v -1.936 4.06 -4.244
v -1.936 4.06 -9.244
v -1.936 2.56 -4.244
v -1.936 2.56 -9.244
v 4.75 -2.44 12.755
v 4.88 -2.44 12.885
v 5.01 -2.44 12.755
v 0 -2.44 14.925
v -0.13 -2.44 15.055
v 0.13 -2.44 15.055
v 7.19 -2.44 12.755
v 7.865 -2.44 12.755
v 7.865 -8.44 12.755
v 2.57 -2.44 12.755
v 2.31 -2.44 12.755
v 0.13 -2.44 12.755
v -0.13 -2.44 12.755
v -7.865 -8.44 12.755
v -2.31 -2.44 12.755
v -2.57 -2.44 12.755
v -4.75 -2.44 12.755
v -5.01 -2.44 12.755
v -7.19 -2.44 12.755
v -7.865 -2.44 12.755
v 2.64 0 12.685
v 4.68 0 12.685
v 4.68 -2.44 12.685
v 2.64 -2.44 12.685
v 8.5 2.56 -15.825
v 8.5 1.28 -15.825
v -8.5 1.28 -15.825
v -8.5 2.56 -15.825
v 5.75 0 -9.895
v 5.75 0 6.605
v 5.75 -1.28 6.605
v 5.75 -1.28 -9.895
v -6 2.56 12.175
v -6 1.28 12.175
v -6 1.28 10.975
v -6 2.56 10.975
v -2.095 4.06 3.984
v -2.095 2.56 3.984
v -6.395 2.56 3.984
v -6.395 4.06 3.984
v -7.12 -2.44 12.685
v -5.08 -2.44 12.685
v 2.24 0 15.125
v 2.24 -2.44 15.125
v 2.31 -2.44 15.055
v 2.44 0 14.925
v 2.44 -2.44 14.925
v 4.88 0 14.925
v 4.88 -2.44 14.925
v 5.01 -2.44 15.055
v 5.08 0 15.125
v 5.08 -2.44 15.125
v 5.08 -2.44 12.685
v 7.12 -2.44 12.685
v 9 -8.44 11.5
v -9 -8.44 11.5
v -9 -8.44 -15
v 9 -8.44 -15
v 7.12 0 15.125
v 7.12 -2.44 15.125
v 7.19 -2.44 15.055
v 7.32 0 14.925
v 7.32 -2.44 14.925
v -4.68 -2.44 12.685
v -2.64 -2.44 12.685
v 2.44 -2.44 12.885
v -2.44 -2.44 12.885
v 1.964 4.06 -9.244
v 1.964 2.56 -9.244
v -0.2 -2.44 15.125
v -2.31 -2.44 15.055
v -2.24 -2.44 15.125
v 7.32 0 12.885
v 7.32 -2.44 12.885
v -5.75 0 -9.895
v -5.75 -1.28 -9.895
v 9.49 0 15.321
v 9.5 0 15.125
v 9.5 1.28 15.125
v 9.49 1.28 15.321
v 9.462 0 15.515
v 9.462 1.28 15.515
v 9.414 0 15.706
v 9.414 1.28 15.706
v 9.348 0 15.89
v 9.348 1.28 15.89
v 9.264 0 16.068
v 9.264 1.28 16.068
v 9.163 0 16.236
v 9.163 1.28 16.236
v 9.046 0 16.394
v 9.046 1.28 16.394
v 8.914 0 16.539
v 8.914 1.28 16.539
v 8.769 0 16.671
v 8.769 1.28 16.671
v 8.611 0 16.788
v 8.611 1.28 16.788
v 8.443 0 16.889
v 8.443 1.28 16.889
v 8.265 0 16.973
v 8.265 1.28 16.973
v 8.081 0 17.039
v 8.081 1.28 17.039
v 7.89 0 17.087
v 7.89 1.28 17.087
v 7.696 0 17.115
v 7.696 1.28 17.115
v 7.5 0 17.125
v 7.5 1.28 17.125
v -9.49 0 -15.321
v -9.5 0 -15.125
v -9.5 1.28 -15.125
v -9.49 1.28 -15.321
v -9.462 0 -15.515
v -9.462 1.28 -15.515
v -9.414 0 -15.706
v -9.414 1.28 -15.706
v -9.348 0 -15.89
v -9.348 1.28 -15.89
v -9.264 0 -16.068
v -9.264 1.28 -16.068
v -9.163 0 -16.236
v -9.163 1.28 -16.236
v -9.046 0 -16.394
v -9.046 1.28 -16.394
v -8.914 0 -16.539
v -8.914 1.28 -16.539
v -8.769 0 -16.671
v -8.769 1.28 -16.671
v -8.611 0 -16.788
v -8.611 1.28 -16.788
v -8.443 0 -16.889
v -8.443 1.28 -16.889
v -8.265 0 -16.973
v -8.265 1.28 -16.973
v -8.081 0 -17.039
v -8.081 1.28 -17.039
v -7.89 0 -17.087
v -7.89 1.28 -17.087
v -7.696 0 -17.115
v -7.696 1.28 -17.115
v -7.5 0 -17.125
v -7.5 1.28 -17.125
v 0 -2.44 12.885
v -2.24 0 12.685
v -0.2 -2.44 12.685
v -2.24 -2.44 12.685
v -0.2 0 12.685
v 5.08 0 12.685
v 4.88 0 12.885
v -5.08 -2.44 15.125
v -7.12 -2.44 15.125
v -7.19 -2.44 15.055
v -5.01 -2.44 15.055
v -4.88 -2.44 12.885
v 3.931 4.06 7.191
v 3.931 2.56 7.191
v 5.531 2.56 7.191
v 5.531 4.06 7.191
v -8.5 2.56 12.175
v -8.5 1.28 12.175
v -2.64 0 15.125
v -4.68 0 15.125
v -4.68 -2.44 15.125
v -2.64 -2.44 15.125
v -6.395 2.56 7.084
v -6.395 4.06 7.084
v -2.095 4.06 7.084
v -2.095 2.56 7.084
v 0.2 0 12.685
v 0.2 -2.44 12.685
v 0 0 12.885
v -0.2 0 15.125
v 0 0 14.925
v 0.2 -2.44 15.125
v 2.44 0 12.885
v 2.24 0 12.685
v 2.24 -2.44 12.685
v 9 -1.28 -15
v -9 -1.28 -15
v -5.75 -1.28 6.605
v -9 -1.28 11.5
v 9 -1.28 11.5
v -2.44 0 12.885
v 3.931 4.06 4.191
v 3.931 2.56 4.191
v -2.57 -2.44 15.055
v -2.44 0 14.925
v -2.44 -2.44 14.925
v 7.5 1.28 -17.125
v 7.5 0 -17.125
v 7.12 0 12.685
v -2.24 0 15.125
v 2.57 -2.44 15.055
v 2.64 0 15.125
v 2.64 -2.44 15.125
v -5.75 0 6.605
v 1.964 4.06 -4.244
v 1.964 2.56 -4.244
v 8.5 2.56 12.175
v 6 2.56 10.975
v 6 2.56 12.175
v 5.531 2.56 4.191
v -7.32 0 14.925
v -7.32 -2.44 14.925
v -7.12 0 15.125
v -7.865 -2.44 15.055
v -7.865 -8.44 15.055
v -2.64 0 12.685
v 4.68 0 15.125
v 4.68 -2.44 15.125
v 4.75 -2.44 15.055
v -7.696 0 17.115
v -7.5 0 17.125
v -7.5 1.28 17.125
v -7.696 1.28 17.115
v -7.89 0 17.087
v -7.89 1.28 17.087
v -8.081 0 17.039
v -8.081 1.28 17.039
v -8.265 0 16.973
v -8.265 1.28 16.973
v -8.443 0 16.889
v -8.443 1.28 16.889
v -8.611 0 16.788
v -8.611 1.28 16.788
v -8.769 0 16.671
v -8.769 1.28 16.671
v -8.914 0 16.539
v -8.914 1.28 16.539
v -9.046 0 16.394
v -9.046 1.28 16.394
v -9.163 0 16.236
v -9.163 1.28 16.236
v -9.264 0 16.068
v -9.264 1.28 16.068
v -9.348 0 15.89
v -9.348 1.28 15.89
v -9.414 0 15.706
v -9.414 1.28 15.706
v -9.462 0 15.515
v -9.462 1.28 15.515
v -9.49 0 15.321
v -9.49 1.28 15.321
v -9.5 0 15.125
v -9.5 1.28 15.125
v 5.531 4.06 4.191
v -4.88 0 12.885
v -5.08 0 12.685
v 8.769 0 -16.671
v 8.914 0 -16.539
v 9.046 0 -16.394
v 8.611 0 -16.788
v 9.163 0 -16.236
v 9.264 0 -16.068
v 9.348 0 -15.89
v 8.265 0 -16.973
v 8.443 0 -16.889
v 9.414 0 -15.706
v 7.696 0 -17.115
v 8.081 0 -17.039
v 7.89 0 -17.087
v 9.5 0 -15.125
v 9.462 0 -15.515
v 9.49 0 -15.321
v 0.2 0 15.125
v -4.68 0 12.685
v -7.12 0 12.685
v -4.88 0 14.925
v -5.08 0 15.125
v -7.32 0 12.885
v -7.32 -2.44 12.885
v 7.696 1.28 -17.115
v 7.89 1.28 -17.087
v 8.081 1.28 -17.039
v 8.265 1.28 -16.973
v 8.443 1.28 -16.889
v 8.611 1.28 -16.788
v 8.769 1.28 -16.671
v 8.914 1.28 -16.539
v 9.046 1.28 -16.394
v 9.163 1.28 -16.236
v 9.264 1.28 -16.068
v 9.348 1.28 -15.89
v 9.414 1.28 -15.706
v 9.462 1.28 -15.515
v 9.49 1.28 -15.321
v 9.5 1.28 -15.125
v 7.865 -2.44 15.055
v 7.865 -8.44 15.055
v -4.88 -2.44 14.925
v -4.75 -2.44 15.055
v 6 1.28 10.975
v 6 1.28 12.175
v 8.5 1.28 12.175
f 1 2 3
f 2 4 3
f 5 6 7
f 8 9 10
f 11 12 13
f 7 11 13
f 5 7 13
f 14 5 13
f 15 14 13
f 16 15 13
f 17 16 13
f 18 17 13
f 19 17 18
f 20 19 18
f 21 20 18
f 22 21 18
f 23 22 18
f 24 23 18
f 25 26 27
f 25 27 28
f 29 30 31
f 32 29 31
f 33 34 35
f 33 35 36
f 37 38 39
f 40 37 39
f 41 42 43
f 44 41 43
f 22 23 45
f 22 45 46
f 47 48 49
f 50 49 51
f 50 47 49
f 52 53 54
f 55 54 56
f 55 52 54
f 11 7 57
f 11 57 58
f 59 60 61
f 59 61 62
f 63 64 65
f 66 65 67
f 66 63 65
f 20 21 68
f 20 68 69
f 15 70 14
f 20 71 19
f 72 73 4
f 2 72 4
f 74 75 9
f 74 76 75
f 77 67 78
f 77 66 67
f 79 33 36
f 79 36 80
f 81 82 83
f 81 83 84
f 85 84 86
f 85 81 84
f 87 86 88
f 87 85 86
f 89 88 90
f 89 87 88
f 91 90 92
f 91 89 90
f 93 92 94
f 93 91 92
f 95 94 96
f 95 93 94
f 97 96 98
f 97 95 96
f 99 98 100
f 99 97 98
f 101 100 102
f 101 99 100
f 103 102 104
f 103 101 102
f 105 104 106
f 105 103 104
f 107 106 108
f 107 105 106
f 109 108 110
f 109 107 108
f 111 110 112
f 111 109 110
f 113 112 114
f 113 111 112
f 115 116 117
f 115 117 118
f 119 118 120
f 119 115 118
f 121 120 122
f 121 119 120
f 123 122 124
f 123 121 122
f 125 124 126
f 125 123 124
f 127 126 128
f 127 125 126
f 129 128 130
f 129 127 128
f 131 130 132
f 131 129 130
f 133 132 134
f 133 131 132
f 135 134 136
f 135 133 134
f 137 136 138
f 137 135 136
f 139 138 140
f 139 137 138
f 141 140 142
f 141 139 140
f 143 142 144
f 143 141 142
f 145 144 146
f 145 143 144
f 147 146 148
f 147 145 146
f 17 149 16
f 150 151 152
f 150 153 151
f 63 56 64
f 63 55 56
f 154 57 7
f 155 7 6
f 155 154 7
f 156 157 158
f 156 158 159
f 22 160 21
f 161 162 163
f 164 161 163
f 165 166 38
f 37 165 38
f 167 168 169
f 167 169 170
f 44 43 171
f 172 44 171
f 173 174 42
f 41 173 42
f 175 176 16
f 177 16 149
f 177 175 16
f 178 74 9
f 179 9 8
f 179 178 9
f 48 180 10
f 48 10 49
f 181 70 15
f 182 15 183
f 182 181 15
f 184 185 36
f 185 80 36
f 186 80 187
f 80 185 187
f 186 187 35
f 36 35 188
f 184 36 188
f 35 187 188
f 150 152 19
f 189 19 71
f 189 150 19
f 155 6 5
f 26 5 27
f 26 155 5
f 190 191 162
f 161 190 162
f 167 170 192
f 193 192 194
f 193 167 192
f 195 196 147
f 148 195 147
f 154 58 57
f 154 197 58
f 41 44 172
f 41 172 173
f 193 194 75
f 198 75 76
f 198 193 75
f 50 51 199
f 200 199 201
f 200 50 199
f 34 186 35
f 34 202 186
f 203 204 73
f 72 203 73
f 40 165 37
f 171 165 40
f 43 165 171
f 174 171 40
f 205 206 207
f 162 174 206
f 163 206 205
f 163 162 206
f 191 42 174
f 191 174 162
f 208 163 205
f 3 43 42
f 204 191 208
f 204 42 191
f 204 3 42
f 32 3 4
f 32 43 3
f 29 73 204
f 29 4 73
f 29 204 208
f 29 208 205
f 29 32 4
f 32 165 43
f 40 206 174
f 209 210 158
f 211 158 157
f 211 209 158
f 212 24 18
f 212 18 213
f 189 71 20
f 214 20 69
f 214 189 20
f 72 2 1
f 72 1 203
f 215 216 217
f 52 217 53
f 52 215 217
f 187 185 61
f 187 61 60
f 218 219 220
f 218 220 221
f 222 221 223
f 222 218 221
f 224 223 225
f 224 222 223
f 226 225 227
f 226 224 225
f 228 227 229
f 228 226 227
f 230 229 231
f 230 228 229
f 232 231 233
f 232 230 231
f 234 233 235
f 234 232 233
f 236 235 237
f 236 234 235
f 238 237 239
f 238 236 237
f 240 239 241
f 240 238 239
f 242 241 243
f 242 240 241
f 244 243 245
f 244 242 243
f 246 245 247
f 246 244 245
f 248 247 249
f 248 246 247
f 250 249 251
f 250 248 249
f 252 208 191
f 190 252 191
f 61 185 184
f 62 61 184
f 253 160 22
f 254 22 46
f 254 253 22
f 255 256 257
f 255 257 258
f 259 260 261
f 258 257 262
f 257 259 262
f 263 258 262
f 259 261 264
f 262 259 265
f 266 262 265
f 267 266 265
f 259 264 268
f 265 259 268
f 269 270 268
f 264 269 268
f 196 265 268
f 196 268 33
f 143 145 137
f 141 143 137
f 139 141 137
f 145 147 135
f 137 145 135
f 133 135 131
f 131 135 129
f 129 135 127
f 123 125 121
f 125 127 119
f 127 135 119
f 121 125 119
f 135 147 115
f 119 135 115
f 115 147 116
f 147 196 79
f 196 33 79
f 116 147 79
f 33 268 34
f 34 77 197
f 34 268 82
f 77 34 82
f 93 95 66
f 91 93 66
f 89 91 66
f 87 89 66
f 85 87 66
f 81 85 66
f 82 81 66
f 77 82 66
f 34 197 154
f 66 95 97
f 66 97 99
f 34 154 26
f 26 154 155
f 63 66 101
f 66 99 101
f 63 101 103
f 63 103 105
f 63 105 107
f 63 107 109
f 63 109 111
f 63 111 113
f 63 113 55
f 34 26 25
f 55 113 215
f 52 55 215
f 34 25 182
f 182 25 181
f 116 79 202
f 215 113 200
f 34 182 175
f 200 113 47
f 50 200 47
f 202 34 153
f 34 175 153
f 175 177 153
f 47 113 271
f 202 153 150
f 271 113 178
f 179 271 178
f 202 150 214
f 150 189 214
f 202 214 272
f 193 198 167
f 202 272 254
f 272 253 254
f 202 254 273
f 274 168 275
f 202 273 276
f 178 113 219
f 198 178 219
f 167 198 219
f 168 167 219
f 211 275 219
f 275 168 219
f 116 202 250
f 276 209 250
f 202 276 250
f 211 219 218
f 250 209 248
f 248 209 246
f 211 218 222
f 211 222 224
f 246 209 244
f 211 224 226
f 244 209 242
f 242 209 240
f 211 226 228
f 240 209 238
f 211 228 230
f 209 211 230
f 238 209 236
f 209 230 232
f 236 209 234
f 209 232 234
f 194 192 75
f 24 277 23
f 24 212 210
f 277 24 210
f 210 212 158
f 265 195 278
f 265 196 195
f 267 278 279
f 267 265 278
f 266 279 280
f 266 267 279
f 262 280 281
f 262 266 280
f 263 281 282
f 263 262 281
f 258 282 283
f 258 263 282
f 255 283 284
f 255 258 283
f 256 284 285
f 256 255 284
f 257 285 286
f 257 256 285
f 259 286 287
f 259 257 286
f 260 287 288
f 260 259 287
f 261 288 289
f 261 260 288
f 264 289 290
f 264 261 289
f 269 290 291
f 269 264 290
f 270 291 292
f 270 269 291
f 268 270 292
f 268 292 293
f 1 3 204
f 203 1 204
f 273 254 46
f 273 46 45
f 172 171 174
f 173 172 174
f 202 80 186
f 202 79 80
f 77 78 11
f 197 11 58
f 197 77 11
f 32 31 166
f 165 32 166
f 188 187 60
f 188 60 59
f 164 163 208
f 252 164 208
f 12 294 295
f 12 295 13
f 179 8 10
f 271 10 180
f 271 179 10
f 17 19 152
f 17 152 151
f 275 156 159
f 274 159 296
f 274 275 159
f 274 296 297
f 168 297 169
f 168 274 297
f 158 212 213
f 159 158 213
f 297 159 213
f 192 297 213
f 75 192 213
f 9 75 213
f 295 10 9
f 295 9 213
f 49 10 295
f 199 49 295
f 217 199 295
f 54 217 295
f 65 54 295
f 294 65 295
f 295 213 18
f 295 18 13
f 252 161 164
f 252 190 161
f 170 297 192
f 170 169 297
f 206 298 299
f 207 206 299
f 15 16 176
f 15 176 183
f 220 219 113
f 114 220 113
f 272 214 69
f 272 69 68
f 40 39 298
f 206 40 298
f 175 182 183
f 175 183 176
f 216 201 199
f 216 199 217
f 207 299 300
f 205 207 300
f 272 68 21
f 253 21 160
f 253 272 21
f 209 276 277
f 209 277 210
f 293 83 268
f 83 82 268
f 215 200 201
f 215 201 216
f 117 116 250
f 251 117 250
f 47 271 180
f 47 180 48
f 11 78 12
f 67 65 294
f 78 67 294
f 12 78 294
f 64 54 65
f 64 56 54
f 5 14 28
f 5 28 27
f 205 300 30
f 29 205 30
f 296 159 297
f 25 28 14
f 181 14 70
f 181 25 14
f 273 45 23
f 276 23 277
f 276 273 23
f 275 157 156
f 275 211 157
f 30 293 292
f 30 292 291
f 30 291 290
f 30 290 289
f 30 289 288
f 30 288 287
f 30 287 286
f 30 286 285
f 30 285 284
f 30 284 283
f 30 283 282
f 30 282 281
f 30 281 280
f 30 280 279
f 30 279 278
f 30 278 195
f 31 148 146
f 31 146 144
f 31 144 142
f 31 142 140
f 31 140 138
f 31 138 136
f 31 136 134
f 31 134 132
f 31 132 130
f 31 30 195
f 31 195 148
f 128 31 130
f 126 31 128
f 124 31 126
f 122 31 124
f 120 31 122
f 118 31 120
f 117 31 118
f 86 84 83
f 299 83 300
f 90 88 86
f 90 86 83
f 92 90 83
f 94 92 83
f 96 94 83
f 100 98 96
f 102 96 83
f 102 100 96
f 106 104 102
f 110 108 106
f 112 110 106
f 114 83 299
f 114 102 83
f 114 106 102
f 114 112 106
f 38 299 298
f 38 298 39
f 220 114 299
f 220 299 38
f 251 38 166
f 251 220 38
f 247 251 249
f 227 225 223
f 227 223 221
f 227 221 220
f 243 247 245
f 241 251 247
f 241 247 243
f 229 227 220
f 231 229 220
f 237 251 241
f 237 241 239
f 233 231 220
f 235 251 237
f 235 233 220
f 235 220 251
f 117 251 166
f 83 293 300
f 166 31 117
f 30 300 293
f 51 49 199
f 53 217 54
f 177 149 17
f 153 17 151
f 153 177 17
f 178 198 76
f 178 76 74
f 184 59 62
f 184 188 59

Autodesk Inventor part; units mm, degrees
ref_plane "YZ Plane" through (0, 0, 0) normal (1, 0, 0) x (0, 1, 0)
ref_plane "XZ Plane" through (0, 0, 0) normal (0, 1, 0) x (-1, 0, 0)
sketch "Sketch1" plane through (0, 0, 0) normal (0, 1, 0) x (-1, 0, 0)
  line L0 (7.5, 17.125) -> (-7.5, 17.125)
  line L1 (-9.5, 15.125) -> (-9.5, -15.125)
  line L2 (-7.5, -17.125) -> (7.5, -17.125)
  line L3 (9.5, -15.125) -> (9.5, 15.125)
  line L4 (9.5, 17.125) -> (-9.5, -17.125) construction
  line L5 (-9.5, 17.125) -> (9.5, -17.125) construction
  arc A0 (7.5, -17.125) -> (9.5, -15.125) centre (7.5, -15.125) ccw
  arc A1 (-9.5, -15.125) -> (-7.5, -17.125) centre (-7.5, -15.125) ccw
  arc A2 (-7.5, 17.125) -> (-9.5, 15.125) centre (-7.5, 15.125) ccw
  arc A3 (9.5, 15.125) -> (7.5, 17.125) centre (7.5, 15.125) ccw
  point P0 (0, 0)
  dimension "d0" = 19
  dimension "d1" = 34.25
  dimension "d2" = 2
extrude "Extrusion1" add sketch "Sketch1" along normal blind 1.28
sketch "Sketch2" plane through (0, 1.28, 0) normal (0, 1, 0) x (1, 0, 0)
  line L0 (8.5, -12.175) -> (8.5, 15.825)
  line L1 (8.5, 15.825) -> (-8.5, 15.825)
  line L2 (-8.5, 15.825) -> (-8.5, -12.175)
  line L3 (-8.5, -12.175) -> (8.5, 15.825) construction
  line L4 (8.5, -12.175) -> (-8.5, 15.825) construction
  line L5 (7.5, 17.125) -> (-7.5, 17.125) projected
  line L6 (0, 17.125) -> (0, 15.825)
  line L7 (-6, -10.975) -> (6, -10.975)
  line L8 (6, -10.975) -> (6, -12.175)
  line L9 (-6, -12.175) -> (-6, -10.975)
  line L10 (-8.5, -12.175) -> (-6, -12.175)
  line L11 (6, -12.175) -> (8.5, -12.175)
  point P0 (0, 0)
  point P1 (0, 15.825)
  dimension "d5" = 17
  dimension "d6" = 28
  dimension "d7" = 1.3
  dimension "d9" = 1.2
extrude "Extrusion2" add sketch "Sketch2" along normal blind 1.28
sketch "Sketch3" plane through (0, 0, 0) normal (0, -1, 0) x (1, 0, 0)
  line L0 (5.75, -9.895) -> (-5.75, -9.895)
  line L1 (-5.75, -9.895) -> (-5.75, 6.605)
  line L2 (-5.75, 6.605) -> (5.75, 6.605)
  line L3 (5.75, 6.605) -> (5.75, -9.895)
  line L4 (7.5, -17.125) -> (-7.5, -17.125) projected
  line L5 (0, -17.125) -> (0, -9.895)
  point P0 (0, 0)
  point P1 (0, -9.895)
  dimension "d12" = 11.5
  dimension "d13" = 16.5
  dimension "d14" = 7.23
extrude "Extrusion3" add sketch "Sketch3" along normal blind 1.28
sketch "Sketch4" plane through (0, 0, 0) normal (0, -1, 0) x (1, 0, 0)
  line L0 (-7.5, 17.125) -> (7.5, 17.125) projected
  line L1 (0, 17.125) -> (0, 15.125)
  line L2 (0.2, 15.125) -> (2.24, 15.125)
  line L3 (2.44, 14.925) -> (2.44, 12.885)
  line L4 (2.24, 12.685) -> (0.2, 12.685)
  line L5 (0, 12.885) -> (0, 14.925)
  line L6 (0, 14.925) -> (0.2, 15.125)
  line L7 (2.24, 15.125) -> (2.44, 14.925)
  line L8 (2.44, 12.885) -> (2.24, 12.685)
  line L9 (0.2, 12.685) -> (0, 12.885)
  line L10 (2.64, 15.125) -> (4.68, 15.125)
  line L11 (4.88, 14.925) -> (4.88, 12.885)
  line L12 (4.68, 12.685) -> (2.64, 12.685)
  line L13 (2.44, 12.885) -> (2.44, 14.925)
  line L14 (2.44, 14.925) -> (2.64, 15.125)
  line L15 (4.68, 15.125) -> (4.88, 14.925)
  line L16 (4.88, 12.885) -> (4.68, 12.685)
  line L17 (2.64, 12.685) -> (2.44, 12.885)
  line L18 (5.08, 15.125) -> (7.12, 15.125)
  line L19 (7.32, 14.925) -> (7.32, 12.885)
  line L20 (7.12, 12.685) -> (5.08, 12.685)
  line L21 (4.88, 12.885) -> (4.88, 14.925)
  line L22 (4.88, 14.925) -> (5.08, 15.125)
  line L23 (7.12, 15.125) -> (7.32, 14.925)
  line L24 (7.32, 12.885) -> (7.12, 12.685)
  line L25 (5.08, 12.685) -> (4.88, 12.885)
  line L26 (-2.24, 15.125) -> (-0.2, 15.125)
  line L27 (0, 14.925) -> (0, 12.885)
  line L28 (-0.2, 12.685) -> (-2.24, 12.685)
  line L29 (-2.44, 12.885) -> (-2.44, 14.925)
  line L30 (-2.44, 14.925) -> (-2.24, 15.125)
  line L31 (-0.2, 15.125) -> (0, 14.925)
  line L32 (0, 12.885) -> (-0.2, 12.685)
  line L33 (-2.24, 12.685) -> (-2.44, 12.885)
  line L34 (-4.68, 15.125) -> (-2.64, 15.125)
  line L35 (-2.44, 14.925) -> (-2.44, 12.885)
  line L36 (-2.64, 12.685) -> (-4.68, 12.685)
  line L37 (-4.88, 12.885) -> (-4.88, 14.925)
  line L38 (-4.88, 14.925) -> (-4.68, 15.125)
  line L39 (-2.64, 15.125) -> (-2.44, 14.925)
  line L40 (-2.44, 12.885) -> (-2.64, 12.685)
  line L41 (-4.68, 12.685) -> (-4.88, 12.885)
  line L42 (-7.12, 15.125) -> (-5.08, 15.125)
  line L43 (-4.88, 14.925) -> (-4.88, 12.885)
  line L44 (-5.08, 12.685) -> (-7.12, 12.685)
  line L45 (-7.32, 12.885) -> (-7.32, 14.925)
  line L46 (-7.32, 14.925) -> (-7.12, 15.125)
  line L47 (-5.08, 15.125) -> (-4.88, 14.925)
  line L48 (-4.88, 12.885) -> (-5.08, 12.685)
  line L49 (-7.12, 12.685) -> (-7.32, 12.885)
  point P0 (0, 0)
  point P1 (2.44, 12.685)
  point P2 (2.44, 15.125)
  point P3 (0, 12.685)
  point P4 (2.44, 15.125)
  point P5 (4.88, 12.685)
  point P6 (4.88, 15.125)
  point P7 (2.44, 12.685)
  point P8 (4.88, 15.125)
  point P9 (7.32, 12.685)
  point P10 (7.32, 15.125)
  point P11 (4.88, 12.685)
  point P12 (-2.44, 15.125)
  point P13 (0, 12.685)
  point P14 (-2.44, 12.685)
  point P15 (-4.88, 15.125)
  point P16 (-2.44, 12.685)
  point P17 (-2.44, 15.125)
  point P18 (-4.88, 12.685)
  point P19 (-7.32, 15.125)
  point P20 (-4.88, 12.685)
  point P21 (-4.88, 15.125)
  point P22 (-7.32, 12.685)
  dimension "d27" = 2
extrude "Extrusion4" add sketch "Sketch4" along normal blind 2.44
sketch "Sketch5" plane through (0, -2.44, 0) normal (0, -1, 0) x (1, 0, 0)
  line L0 (-7.865, 15.055) -> (7.865, 15.055)
  line L1 (7.865, 15.055) -> (7.865, 12.755)
  line L2 (7.865, 12.755) -> (-7.865, 12.755)
  line L3 (-7.865, 12.755) -> (-7.865, 15.055)
  line L4 (0.2, 12.685) -> (0, 12.885) projected
  line L5 (0, 14.925) -> (0, 12.885)
  point P0 (0, 0)
  point P1 (0, 13.905)
  point P2 (0, 13.905)
  dimension "d30" = 15.73
  dimension "d31" = 2.3
extrude "Extrusion5" add sketch "Sketch5" along normal blind 6
sketch "Sketch6" plane through (0, 2.56, 0) normal (0, 1, 0) x (1, 0, 0)
  line L0 (-1.9361, 4.2441) -> (1.9639, 4.2441)
  line L1 (1.9639, 4.2441) -> (1.9639, 9.2441)
  line L2 (1.9639, 9.2441) -> (-1.9361, 9.2441)
  line L3 (-1.9361, 9.2441) -> (-1.9361, 4.2441)
  line L4 (-6.3946, -7.0839) -> (-2.0946, -7.0839)
  line L5 (-2.0946, -7.0839) -> (-2.0946, -3.9839)
  line L6 (-2.0946, -3.9839) -> (-6.3946, -3.9839)
  line L7 (-6.3946, -3.9839) -> (-6.3946, -7.0839)
  line L8 (3.9309, -7.1914) -> (5.5309, -7.1914)
  line L9 (5.5309, -7.1914) -> (5.5309, -4.1914)
  line L10 (5.5309, -4.1914) -> (3.9309, -4.1914)
  line L11 (3.9309, -4.1914) -> (3.9309, -7.1914)
  line L12 (8.5, 15.825) -> (-8.5, 15.825) projected
  point P0 (0, 0)
  point P1 (3.9309, -5.6914)
  point P2 (0, 15.825)
  point P3 (0.0139, 9.2441)
  point P4 (-2.0946, -5.5339)
  dimension "d34" = 3.9
  dimension "d35" = 5
  dimension "d36" = 4.3
  dimension "d37" = 3.1
  dimension "d38" = 1.6
  dimension "d39" = 3
extrude "Extrusion6" add sketch "Sketch6" along normal blind 1.5
sketch "Sketch7" plane through (0, -1.28, 0) normal (0, -1, 0) x (1, 0, 0)
  line L0 (-9, 11.5) -> (9, 11.5)
  line L1 (9, 11.5) -> (9, -11.5)
  line L2 (-8.5, -11.5) -> (-9, -11.5)
  line L3 (-9, -11.5) -> (-9, 11.5)
  line L4 (-9, -11.5) -> (-9, -15)
  line L5 (-8.5, -15.825) -> (-8.5, 12.175) projected
  line L6 (-9, -11.5) -> (-5.5, -11.5) construction
  line L7 (-9, -15) -> (9, -15)
  line L8 (9, -15) -> (9, -11.5)
  dimension "d42" = 18
  dimension "d43" = 23
  dimension "d46" = 3.5
  dimension "d47" = 90
  dimension "d48" = 90
ref_plane "Work Plane1" through (-19.708, -8.44, -77.2303) normal (0, 1, 0) x (0, 0, 1)
extrude "Extrusion7" add sketch "Sketch7" along normal up to surface (7.16 mm away)
properties part number "BMS"
